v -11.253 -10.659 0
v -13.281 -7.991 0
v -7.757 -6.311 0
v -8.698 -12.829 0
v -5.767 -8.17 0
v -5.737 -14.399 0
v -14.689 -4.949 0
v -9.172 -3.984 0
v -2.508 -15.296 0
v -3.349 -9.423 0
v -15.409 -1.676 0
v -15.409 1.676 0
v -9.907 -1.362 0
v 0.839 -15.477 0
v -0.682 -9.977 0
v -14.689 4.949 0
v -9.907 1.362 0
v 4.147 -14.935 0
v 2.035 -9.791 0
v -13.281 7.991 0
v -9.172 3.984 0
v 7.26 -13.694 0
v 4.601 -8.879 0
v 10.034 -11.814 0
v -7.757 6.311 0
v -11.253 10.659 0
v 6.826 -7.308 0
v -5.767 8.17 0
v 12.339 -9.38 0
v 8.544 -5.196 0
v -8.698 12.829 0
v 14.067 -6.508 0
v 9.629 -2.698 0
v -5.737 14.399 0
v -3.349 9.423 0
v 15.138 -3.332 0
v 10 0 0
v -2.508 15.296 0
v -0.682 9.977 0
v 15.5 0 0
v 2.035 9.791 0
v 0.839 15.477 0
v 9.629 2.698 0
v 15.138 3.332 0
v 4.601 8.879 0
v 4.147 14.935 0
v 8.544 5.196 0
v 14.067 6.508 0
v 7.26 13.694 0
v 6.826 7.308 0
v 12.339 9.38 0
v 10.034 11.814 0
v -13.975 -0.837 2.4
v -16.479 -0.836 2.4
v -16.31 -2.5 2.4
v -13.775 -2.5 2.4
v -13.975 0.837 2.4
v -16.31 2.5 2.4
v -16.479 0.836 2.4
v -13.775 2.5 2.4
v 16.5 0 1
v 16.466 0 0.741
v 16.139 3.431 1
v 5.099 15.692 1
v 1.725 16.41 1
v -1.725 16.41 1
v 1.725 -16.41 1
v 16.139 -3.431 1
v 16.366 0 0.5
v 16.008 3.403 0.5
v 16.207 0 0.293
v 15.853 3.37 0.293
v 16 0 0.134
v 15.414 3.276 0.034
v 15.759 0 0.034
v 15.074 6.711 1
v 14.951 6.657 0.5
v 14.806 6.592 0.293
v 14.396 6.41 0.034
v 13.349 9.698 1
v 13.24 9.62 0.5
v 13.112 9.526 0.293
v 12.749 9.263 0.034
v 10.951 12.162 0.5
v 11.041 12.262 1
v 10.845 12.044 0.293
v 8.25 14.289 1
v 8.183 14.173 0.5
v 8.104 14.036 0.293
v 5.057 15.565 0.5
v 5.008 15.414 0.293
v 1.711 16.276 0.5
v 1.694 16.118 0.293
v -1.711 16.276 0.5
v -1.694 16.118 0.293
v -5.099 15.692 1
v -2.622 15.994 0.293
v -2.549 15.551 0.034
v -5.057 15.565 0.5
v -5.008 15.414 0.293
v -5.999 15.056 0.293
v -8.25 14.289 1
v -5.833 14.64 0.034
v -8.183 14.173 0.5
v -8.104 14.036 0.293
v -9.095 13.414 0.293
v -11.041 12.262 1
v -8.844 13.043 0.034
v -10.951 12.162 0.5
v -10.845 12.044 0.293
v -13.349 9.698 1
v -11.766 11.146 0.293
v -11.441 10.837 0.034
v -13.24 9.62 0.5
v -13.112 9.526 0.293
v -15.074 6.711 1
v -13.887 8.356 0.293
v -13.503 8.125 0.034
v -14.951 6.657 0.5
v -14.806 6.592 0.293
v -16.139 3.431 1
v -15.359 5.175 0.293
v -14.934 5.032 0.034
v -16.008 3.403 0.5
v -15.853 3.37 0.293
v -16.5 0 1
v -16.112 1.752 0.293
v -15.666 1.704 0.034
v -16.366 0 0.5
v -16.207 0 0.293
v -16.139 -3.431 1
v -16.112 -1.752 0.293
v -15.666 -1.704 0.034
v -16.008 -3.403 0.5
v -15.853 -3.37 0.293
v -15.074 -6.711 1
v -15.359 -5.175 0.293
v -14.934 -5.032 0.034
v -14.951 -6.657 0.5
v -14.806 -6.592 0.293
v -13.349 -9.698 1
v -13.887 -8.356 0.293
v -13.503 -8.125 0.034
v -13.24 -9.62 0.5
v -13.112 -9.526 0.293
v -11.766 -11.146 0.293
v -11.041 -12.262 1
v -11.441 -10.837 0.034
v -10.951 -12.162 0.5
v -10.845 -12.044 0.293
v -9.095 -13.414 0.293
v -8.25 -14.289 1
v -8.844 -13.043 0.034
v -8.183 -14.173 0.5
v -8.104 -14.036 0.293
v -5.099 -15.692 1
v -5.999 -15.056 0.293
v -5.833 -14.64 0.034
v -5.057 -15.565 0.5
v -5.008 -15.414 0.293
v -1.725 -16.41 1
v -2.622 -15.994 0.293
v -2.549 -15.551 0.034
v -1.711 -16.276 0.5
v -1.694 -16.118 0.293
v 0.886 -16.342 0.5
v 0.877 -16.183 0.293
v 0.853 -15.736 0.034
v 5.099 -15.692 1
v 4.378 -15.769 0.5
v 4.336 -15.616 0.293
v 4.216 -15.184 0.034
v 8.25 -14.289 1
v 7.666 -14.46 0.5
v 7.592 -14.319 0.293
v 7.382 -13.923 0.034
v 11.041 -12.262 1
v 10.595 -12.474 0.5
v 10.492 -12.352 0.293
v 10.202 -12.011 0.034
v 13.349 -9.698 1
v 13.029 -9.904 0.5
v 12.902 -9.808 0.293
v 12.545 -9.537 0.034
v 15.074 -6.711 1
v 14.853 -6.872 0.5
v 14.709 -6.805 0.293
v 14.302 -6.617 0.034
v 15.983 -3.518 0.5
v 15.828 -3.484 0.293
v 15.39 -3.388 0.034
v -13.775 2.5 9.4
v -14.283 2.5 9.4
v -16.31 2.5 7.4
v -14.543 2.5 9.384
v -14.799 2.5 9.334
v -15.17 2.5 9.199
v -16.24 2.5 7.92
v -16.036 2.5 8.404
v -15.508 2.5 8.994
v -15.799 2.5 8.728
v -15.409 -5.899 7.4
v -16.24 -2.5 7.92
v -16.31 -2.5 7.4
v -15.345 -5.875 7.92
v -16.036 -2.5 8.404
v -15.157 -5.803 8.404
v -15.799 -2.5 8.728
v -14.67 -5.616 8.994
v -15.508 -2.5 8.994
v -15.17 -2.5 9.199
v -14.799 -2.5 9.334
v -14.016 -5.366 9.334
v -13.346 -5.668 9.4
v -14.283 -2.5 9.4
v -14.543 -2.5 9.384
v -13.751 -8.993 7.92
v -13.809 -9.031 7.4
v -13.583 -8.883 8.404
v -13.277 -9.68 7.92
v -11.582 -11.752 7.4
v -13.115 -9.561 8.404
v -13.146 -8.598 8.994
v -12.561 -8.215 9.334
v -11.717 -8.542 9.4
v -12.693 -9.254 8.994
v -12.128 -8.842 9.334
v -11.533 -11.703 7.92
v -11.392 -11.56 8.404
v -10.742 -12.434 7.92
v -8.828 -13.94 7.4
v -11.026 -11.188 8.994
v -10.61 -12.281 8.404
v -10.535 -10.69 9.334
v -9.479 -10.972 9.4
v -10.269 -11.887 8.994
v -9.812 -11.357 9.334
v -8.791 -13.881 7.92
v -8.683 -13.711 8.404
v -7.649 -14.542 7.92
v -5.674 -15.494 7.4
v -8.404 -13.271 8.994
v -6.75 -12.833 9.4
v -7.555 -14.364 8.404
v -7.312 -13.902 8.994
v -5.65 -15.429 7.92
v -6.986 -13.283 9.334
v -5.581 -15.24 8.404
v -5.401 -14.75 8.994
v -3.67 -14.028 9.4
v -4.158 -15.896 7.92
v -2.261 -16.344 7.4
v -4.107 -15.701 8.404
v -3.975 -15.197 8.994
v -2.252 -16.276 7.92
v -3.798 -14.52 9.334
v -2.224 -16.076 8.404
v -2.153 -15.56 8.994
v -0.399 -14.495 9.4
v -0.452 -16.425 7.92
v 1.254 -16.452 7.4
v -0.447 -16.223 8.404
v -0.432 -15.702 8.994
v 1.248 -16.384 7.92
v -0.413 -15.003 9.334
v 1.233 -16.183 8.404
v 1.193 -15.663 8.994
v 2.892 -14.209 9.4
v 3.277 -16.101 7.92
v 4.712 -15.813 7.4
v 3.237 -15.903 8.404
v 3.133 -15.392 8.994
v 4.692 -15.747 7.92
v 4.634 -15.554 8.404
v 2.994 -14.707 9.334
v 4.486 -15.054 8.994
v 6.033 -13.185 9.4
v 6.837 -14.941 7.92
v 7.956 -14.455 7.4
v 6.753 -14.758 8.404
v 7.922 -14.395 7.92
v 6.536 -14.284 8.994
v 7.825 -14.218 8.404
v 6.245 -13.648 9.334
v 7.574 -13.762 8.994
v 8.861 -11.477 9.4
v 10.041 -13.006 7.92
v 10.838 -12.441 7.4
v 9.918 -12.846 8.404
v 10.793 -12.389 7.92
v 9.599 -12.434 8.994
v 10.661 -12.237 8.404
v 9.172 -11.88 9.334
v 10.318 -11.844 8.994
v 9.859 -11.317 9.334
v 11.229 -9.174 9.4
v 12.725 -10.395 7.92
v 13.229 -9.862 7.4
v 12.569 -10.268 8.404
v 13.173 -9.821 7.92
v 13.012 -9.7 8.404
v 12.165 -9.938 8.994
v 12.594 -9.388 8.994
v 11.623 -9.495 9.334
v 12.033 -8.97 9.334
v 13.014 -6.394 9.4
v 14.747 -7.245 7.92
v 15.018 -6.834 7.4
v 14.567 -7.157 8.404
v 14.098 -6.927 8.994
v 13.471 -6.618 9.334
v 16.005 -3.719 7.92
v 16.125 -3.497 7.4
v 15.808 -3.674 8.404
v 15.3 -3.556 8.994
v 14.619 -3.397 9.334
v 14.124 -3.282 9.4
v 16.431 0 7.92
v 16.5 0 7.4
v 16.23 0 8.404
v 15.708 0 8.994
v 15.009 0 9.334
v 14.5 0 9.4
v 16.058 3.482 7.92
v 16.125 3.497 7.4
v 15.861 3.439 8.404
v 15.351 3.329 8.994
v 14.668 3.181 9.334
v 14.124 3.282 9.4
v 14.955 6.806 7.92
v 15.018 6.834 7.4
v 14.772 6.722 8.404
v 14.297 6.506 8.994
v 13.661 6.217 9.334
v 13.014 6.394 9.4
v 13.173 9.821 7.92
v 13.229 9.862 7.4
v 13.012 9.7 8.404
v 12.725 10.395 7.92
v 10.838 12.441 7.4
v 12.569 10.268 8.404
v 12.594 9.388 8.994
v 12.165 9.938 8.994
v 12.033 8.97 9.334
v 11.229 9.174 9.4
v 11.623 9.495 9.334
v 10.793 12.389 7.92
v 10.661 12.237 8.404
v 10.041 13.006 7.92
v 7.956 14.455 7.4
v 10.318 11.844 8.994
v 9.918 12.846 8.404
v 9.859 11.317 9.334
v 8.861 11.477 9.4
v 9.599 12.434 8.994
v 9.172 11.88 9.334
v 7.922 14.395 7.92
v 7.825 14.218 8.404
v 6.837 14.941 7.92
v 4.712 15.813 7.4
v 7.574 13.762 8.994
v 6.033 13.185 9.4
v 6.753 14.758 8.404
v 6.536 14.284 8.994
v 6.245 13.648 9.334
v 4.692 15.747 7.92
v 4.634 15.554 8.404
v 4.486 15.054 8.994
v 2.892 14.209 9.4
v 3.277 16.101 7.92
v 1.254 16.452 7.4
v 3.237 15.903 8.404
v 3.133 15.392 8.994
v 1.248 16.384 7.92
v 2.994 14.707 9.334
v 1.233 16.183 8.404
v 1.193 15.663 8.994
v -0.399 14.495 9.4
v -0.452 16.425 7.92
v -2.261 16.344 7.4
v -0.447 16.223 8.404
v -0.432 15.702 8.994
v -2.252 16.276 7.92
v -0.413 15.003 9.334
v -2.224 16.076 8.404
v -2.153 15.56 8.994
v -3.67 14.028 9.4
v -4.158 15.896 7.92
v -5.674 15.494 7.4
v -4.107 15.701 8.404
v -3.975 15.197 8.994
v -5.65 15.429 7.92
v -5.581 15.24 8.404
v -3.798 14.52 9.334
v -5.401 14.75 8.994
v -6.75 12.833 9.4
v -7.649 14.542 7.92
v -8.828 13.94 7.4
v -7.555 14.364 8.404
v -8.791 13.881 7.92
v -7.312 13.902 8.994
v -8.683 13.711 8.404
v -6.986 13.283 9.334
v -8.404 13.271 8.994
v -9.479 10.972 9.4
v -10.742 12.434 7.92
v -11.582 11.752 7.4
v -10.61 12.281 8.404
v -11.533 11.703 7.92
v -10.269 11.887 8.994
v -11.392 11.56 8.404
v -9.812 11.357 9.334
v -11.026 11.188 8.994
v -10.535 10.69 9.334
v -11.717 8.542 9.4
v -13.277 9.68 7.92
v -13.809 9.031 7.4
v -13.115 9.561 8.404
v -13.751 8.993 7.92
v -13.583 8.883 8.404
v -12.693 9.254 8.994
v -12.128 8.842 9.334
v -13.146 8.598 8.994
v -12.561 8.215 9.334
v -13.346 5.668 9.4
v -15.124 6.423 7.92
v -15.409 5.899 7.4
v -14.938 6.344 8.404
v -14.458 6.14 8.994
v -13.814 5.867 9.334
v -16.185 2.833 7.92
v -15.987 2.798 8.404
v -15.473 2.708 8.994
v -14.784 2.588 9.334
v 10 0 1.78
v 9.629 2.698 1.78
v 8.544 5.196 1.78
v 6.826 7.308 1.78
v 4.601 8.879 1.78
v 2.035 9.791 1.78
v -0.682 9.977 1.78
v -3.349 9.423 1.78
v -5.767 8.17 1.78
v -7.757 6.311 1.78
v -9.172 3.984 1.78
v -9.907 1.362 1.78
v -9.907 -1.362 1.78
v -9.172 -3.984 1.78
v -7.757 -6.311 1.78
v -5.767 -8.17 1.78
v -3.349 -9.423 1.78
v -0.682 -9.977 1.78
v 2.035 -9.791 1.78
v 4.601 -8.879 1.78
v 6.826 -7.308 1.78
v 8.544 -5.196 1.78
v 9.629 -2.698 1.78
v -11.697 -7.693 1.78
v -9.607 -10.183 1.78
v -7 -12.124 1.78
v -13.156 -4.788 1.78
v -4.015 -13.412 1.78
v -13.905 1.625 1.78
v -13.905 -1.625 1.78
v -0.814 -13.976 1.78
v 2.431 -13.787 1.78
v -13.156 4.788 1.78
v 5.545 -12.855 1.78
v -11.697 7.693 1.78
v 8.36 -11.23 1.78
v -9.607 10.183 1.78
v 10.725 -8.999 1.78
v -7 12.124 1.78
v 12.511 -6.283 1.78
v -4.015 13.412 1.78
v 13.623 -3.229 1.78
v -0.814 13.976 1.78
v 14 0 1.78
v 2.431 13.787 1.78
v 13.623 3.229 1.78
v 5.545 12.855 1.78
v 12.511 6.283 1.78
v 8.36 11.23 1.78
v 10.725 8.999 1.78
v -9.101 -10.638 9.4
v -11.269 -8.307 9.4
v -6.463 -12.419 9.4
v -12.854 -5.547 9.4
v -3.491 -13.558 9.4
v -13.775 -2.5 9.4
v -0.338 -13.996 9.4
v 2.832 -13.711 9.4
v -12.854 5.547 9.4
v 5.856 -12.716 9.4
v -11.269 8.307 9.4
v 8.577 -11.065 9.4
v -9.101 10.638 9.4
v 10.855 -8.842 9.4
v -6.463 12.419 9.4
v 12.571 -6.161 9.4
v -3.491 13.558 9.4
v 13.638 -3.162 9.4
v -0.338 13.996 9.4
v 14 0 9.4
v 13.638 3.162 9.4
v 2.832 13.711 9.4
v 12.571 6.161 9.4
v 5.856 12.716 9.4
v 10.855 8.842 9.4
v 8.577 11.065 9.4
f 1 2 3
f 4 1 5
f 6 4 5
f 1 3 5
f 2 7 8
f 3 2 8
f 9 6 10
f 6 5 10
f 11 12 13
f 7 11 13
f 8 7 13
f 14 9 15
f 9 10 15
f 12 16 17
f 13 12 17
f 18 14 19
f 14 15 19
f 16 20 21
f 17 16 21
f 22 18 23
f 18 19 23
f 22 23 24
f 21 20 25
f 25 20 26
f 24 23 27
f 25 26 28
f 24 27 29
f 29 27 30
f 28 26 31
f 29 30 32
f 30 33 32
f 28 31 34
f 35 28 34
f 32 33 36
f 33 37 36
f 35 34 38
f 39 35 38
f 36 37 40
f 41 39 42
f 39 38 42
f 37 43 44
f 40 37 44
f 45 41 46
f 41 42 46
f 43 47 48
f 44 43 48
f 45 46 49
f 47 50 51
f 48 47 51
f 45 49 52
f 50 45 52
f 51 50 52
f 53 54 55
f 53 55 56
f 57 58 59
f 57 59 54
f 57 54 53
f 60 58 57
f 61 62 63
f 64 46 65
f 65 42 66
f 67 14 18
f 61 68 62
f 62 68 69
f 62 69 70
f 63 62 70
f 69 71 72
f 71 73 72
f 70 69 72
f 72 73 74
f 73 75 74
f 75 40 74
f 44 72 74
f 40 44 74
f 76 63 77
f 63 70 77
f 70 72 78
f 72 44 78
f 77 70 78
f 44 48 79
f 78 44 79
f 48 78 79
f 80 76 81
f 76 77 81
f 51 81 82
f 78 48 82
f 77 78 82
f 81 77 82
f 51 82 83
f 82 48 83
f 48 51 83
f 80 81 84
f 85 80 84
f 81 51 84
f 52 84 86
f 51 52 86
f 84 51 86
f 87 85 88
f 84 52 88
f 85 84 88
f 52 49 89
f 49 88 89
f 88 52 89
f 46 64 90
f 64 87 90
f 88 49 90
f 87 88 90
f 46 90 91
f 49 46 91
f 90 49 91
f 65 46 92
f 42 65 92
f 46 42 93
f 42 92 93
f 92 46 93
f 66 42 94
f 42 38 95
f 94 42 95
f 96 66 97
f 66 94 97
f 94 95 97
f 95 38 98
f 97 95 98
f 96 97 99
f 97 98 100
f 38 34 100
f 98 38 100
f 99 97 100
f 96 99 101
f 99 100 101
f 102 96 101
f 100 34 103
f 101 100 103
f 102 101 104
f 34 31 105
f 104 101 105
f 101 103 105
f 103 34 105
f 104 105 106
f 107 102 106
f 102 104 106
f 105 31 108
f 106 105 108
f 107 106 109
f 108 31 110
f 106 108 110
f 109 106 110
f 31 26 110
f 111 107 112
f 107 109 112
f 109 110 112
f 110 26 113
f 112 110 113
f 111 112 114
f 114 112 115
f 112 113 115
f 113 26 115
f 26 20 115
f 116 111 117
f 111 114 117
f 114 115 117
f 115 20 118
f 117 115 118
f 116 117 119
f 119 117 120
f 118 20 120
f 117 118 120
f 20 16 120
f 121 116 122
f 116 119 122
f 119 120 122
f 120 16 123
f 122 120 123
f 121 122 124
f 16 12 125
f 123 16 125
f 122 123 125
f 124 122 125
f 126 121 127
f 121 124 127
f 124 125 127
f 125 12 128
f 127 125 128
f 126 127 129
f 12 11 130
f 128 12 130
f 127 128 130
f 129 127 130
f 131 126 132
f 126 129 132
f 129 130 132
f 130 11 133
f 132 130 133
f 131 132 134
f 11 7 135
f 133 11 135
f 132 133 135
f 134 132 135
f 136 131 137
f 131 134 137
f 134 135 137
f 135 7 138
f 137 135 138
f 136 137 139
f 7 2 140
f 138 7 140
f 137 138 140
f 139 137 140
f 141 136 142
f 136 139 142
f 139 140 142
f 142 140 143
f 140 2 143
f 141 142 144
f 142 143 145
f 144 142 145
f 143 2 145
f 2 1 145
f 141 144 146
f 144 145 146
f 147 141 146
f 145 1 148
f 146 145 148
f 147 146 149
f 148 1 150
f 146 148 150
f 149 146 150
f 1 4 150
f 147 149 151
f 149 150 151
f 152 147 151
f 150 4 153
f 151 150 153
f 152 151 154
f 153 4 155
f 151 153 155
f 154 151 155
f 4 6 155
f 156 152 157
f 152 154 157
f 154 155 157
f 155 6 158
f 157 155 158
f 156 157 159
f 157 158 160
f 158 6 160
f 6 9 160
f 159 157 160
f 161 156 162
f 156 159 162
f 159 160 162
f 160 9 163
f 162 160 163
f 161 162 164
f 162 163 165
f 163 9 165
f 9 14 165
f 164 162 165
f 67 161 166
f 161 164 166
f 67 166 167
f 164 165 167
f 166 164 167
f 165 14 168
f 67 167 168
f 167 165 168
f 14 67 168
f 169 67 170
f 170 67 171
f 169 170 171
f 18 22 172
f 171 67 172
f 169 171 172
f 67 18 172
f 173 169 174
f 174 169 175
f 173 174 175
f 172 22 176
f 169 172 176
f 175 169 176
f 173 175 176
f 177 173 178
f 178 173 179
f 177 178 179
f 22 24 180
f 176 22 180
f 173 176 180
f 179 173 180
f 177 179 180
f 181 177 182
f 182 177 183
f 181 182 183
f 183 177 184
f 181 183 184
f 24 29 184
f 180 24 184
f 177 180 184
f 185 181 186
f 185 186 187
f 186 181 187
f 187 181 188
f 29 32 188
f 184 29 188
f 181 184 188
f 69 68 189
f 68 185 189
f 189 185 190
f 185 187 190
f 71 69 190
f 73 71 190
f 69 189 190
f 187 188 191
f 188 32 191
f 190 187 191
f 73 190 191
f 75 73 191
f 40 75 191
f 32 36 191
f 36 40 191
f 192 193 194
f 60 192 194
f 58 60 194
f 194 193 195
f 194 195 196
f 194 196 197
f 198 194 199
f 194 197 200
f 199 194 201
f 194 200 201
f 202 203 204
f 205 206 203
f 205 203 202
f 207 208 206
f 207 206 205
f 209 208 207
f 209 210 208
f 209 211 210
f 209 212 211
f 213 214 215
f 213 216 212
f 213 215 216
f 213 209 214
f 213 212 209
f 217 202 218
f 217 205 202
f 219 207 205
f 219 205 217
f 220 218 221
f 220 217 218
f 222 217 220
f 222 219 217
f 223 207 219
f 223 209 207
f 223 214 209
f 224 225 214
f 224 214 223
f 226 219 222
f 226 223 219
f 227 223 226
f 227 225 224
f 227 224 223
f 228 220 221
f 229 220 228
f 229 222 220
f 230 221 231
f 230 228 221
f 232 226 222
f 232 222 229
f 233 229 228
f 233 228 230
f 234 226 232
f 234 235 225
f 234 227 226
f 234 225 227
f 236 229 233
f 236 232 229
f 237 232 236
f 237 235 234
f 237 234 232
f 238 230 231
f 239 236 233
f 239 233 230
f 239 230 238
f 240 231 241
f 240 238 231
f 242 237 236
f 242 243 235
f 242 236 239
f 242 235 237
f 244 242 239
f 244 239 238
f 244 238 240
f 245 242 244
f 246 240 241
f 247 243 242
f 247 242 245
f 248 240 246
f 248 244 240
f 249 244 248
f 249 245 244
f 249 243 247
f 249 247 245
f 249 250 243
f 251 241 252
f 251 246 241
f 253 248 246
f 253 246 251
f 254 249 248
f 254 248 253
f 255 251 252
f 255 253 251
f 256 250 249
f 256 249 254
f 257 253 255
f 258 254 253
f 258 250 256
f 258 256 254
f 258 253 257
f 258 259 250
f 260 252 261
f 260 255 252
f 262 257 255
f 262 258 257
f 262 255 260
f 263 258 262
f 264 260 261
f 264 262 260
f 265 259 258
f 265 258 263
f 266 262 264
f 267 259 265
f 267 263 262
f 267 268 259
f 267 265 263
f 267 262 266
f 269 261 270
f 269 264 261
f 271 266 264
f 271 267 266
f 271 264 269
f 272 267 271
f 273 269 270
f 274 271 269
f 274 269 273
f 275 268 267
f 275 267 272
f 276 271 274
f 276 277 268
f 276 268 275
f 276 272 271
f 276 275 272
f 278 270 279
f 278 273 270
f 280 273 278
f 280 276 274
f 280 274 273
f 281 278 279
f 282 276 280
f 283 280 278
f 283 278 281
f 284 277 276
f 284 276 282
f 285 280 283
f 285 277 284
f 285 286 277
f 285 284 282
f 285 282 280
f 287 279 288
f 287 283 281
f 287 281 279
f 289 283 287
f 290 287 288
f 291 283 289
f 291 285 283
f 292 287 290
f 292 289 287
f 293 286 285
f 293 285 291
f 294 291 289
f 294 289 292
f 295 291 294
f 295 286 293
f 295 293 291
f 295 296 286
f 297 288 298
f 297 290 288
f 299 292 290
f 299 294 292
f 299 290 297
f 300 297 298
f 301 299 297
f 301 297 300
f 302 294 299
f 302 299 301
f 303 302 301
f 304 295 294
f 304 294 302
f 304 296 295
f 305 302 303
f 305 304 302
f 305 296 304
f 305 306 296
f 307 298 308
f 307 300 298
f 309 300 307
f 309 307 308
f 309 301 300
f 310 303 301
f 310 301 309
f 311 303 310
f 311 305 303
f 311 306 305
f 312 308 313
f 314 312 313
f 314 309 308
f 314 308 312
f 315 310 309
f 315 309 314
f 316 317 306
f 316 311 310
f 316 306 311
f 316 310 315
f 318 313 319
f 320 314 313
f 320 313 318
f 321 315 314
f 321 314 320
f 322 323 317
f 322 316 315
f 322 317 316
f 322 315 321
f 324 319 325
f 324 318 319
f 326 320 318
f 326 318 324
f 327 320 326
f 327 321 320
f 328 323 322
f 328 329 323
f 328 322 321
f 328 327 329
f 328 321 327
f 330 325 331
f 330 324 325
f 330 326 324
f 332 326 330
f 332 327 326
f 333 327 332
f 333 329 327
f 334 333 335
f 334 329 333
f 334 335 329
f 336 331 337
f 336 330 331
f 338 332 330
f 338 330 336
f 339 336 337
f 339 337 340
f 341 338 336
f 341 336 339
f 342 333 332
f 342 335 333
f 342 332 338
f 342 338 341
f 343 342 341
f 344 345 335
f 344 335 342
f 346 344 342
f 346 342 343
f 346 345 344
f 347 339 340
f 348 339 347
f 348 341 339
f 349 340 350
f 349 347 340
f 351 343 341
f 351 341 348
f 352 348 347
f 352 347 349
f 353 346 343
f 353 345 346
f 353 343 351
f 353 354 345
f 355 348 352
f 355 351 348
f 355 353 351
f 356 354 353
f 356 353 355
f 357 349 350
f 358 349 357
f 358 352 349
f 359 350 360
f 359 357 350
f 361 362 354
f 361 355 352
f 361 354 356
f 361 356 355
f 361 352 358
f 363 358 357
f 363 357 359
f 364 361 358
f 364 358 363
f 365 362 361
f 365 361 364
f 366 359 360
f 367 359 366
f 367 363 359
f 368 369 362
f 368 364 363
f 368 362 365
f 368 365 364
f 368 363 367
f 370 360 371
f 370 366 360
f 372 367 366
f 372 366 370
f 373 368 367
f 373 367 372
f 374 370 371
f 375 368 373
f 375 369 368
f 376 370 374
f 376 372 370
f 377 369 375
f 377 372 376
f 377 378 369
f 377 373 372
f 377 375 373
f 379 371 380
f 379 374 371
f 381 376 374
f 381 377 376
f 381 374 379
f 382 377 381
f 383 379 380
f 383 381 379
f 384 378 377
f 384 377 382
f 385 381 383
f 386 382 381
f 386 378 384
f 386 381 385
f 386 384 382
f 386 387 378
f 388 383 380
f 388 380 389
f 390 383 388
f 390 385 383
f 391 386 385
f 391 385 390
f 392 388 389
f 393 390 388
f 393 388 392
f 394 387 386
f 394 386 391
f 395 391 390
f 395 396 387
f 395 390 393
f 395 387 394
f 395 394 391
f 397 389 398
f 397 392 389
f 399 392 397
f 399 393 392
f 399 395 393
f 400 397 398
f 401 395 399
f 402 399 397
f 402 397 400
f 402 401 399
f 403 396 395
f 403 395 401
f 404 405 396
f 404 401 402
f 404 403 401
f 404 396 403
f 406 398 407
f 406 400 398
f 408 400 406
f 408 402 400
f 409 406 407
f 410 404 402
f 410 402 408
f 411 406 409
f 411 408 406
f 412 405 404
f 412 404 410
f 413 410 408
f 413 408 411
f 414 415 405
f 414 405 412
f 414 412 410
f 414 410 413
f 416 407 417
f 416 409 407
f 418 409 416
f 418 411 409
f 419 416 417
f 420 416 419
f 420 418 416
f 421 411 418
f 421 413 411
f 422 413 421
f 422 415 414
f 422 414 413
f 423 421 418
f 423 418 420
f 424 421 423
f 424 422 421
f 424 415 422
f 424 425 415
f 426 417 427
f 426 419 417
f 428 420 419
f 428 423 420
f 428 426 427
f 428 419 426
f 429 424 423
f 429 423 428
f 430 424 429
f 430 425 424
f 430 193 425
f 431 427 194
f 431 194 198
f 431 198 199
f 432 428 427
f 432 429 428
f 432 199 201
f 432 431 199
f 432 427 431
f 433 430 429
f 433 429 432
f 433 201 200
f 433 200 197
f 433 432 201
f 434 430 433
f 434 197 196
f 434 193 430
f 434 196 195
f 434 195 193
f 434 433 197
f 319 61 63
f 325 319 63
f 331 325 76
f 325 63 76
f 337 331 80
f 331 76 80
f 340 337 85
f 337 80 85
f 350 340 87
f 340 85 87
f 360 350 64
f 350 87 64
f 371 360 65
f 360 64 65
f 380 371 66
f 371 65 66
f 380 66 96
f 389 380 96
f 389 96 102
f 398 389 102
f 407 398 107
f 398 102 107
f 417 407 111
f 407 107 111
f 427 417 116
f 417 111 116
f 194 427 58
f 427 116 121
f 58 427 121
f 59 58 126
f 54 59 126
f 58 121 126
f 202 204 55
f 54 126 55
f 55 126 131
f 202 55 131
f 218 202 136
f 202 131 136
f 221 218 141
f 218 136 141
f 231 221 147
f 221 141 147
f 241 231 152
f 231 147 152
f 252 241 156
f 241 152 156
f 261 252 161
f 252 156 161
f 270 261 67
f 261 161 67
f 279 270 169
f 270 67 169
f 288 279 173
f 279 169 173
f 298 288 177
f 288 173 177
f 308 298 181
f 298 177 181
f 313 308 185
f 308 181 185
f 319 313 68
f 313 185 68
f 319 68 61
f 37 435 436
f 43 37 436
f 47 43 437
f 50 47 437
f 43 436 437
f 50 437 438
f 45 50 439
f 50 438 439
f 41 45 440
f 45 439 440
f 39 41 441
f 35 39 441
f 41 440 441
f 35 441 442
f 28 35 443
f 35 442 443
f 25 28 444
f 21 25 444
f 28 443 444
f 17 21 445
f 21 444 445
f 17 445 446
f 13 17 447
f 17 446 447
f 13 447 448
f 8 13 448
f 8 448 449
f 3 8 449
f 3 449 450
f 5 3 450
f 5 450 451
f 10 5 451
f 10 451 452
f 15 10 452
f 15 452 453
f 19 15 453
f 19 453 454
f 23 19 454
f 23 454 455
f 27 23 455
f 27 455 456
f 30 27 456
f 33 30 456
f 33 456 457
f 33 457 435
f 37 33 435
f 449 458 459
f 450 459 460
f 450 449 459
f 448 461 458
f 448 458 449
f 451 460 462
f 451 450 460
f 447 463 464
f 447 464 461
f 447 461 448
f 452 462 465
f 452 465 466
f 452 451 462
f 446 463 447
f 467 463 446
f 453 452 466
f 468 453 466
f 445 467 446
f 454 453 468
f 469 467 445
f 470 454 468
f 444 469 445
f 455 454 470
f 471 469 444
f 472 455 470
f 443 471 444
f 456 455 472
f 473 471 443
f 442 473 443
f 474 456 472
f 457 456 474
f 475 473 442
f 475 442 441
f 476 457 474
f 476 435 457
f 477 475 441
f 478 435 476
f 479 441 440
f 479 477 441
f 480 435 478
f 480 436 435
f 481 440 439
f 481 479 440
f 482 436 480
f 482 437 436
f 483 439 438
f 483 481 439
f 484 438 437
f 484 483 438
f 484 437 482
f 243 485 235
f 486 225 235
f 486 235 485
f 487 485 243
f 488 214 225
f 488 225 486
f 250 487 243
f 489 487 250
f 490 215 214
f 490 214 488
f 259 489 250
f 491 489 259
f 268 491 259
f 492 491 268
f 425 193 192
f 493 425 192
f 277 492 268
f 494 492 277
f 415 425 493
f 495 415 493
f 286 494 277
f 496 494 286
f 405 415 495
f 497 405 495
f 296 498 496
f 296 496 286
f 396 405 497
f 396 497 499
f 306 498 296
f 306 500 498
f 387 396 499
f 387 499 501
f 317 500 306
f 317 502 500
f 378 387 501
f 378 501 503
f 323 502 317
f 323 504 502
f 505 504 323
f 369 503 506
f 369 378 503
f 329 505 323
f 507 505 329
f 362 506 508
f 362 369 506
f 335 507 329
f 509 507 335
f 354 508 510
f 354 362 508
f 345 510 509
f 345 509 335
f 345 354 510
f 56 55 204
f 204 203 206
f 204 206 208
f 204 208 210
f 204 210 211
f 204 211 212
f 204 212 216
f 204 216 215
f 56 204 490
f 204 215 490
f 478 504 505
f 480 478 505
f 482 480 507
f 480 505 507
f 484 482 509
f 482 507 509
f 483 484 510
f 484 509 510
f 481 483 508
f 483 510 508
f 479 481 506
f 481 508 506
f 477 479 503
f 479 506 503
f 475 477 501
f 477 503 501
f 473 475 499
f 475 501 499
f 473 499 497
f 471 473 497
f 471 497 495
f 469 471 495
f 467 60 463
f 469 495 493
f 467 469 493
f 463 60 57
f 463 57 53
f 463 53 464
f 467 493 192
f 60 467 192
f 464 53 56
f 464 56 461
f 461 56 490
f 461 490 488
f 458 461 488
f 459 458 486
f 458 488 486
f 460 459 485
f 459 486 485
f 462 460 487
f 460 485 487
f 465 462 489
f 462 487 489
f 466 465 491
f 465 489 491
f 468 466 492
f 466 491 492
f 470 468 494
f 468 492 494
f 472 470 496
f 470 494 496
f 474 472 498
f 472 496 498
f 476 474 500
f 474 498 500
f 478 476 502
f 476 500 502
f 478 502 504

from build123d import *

# Parameters (mm, degrees)
F0_R      = 16.5
F1_DEPTH  = 9.4
F2_R      = 14
F3_DEPTH  = 7.62
F4_R      = 2
F6_DEPTH  = 7
F8_DEPTH  = 5.5
F9_R      = 1
F10_R     = 10
F11_DEPTH = 3


with BuildPart() as f1:
    # F0 (on Top) → F1 (new body)
    with BuildSketch(Plane.XY):
        Circle(F0_R)
    extrude(amount=F1_DEPTH)

    # F2 (on face) → F3 (cut)
    with BuildSketch(Plane.XY.offset(9.4)):
        Circle(F2_R)
    extrude(amount=-F3_DEPTH, mode=Mode.SUBTRACT)

    # F4
    f4_edges = [f1.edges().sort_by_distance(p)[0] for p in [
        (-16.5, 0, 9.4),
    ]]
    fillet(f4_edges, radius=F4_R)

    # F5 (on face) → F6 (cut)
    with BuildSketch(Plane.XY.offset(9.4)):
        with BuildLine():
            ThreePointArc((-13.774977314, -2.5), (-14, 0), (-13.774977314, 2.5))
            Line((-13.774977314, 2.5), (-16.3095064303, 2.5))
            ThreePointArc((-16.3095064303, 2.5), (-16.5, 0), (-16.3095064303, -2.5))
            Line((-16.3095064303, -2.5), (-13.774977314, -2.5))
        make_face()
    extrude(amount=-F6_DEPTH, mode=Mode.SUBTRACT)

    # F7 (on face) → F8 (cut)
    with BuildSketch(Plane.XY.offset(9.4)):
        with BuildLine():
            ThreePointArc((-13.913931867, -1.55), (-14, 0), (-13.913931867, 1.55))
            Line((-13.913931867, 1.55), (-16.4270356425, 1.55))
            ThreePointArc((-16.4270356425, 1.55), (-16.5, 0), (-16.4270356425, -1.55))
            Line((-16.4270356425, -1.55), (-13.913931867, -1.55))
        make_face()
    extrude(amount=-F8_DEPTH, mode=Mode.SUBTRACT)

    # F9
    f9_edges = [f1.edges().sort_by_distance(p)[0] for p in [
        (-16.5, 0, 0),
    ]]
    fillet(f9_edges, radius=F9_R)

    # F10 (on face) → F11 (cut)
    with BuildSketch(Plane.XY.offset(1.78)):
        Circle(F10_R)
    extrude(amount=-F11_DEPTH, mode=Mode.SUBTRACT)


solid = f1.part
